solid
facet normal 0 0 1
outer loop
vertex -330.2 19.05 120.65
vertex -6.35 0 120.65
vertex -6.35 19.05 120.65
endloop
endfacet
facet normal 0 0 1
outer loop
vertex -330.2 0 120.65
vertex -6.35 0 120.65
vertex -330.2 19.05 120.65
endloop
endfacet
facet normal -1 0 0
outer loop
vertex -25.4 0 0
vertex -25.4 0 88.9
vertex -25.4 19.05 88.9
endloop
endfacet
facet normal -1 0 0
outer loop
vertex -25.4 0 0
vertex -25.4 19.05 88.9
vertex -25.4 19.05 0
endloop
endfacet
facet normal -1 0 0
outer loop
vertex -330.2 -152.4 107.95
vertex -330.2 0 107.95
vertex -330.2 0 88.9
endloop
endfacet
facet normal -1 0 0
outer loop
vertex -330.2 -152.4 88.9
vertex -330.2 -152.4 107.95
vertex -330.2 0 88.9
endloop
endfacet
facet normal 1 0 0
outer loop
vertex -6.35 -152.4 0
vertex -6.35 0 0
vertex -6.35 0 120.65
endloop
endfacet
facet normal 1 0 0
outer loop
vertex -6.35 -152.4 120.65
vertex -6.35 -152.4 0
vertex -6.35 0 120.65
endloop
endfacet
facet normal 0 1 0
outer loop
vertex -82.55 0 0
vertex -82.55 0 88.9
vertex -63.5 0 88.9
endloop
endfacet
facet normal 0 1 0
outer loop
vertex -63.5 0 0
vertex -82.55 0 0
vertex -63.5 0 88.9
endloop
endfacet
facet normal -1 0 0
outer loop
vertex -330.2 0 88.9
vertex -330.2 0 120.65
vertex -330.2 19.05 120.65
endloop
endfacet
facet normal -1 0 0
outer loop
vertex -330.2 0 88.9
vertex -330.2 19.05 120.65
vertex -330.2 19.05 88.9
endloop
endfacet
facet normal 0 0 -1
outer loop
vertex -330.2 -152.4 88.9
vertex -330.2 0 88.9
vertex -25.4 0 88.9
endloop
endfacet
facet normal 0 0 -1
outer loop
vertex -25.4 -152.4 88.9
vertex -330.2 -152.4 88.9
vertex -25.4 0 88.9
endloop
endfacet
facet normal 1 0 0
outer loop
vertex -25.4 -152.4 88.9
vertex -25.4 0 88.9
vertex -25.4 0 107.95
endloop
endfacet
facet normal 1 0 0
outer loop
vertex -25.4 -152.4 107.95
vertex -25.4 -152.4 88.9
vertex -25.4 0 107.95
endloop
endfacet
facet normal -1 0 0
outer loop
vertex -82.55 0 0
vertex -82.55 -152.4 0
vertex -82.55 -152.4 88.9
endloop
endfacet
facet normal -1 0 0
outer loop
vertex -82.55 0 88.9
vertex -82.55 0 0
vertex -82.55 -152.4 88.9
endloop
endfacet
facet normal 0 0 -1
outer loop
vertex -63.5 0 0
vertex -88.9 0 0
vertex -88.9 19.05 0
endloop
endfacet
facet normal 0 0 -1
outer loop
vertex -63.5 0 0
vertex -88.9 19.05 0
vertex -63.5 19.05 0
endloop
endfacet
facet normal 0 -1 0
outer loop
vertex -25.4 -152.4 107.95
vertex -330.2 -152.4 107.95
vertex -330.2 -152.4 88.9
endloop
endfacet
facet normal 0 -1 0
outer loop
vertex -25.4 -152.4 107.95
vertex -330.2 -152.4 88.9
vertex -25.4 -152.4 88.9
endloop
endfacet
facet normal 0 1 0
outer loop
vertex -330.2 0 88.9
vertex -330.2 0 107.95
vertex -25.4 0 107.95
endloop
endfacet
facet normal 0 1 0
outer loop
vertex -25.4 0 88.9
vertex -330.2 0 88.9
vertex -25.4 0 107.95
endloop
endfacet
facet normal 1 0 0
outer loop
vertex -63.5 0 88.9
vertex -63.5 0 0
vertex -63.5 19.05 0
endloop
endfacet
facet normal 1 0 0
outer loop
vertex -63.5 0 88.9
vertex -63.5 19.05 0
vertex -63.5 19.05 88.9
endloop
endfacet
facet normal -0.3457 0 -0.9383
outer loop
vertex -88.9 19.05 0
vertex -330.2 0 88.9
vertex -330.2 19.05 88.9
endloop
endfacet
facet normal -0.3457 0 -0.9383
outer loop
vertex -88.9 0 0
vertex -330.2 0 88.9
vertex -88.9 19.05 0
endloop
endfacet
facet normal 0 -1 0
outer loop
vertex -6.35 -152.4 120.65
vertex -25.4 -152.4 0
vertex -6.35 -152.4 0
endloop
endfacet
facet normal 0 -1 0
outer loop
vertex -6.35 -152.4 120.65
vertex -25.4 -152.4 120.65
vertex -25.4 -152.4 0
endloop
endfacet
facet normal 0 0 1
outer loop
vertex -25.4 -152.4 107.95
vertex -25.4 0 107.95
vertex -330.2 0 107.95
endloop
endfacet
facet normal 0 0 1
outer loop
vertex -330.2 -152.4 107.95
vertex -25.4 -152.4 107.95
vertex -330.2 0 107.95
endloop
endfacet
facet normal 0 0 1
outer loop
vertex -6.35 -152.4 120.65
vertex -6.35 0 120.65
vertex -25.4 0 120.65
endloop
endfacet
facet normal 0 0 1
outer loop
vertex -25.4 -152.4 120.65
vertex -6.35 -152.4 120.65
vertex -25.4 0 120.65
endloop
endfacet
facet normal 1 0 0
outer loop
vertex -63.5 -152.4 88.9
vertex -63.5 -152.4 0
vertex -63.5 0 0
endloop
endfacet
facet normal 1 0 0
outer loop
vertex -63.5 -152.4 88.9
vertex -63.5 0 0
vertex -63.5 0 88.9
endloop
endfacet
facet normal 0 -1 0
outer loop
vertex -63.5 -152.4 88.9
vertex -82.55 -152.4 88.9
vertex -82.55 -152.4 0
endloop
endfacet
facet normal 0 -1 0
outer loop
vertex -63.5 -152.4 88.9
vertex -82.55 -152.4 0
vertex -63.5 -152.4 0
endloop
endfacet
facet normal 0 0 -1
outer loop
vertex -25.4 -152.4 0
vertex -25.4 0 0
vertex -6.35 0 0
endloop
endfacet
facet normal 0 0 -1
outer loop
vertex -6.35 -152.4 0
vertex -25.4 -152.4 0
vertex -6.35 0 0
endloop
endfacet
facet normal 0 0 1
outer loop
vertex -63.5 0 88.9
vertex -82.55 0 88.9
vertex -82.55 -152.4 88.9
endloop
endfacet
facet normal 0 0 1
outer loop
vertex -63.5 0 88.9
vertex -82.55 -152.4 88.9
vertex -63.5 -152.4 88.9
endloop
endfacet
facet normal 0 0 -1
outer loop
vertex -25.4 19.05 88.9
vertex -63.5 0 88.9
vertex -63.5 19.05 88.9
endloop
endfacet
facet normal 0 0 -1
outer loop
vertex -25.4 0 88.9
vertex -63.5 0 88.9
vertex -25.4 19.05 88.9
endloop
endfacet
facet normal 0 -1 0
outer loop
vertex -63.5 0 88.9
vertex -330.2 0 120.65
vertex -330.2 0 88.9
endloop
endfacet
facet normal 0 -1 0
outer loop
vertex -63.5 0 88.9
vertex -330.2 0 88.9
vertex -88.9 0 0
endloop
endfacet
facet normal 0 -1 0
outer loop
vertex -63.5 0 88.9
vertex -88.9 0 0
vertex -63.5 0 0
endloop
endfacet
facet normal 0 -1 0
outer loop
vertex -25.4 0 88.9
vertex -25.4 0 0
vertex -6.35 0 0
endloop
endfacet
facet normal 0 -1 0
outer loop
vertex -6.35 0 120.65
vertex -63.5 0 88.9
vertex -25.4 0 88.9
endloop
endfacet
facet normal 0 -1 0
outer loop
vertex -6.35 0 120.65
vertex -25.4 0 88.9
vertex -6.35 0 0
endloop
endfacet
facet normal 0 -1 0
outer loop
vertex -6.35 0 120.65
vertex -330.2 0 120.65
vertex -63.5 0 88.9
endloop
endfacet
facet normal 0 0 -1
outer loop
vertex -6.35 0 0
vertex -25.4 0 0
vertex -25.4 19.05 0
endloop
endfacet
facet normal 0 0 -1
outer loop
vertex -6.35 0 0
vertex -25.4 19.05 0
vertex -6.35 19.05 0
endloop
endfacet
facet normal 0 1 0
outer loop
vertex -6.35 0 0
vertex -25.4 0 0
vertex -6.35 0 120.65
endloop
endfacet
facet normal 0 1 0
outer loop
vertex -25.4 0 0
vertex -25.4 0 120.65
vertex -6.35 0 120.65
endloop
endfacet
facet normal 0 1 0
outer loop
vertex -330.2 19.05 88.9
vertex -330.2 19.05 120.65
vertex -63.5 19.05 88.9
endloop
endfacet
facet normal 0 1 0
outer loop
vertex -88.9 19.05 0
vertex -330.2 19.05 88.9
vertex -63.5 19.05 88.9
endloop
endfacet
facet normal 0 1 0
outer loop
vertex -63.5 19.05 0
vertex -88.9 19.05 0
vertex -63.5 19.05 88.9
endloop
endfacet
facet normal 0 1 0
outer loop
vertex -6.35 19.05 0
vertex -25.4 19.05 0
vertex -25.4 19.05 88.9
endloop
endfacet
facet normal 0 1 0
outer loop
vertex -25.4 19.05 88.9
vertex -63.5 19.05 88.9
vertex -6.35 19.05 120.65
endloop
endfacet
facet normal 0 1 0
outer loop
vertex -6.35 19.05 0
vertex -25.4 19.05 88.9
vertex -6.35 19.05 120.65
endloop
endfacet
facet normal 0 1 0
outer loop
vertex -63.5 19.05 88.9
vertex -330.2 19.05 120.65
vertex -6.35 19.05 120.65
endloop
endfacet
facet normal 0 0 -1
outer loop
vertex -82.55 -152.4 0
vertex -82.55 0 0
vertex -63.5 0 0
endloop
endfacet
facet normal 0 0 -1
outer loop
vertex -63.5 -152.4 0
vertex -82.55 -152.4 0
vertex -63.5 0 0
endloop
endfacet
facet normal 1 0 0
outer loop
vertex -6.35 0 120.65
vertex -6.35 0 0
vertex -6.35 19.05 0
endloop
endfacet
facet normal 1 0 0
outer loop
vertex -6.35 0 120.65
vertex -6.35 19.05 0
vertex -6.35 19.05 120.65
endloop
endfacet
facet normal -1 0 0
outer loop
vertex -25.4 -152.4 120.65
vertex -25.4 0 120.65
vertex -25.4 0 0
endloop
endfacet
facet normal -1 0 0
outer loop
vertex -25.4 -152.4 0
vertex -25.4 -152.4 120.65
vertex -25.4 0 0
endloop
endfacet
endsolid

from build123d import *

# Parameters (mm, degrees)
F1_DEPTH = 152.4
F0_W     = 19.05
F0_H     = 88.9
F2_DEPTH = 152.4
F3_DEPTH = 152.4
F0_W_2   = 304.8
F0_H_2   = 12.7
F4_DEPTH = 19.05


with BuildPart() as f1:
    # F0 (on Front) → F1 (new body)
    with BuildSketch(Plane.XZ):
        Polygon((-63.5, 88.9), (-25.4, 88.9), (-25.4, 107.95), (-330.2, 107.95), (-330.2, 88.9), (-82.55, 88.9), align=None)
    extrude(amount=F1_DEPTH)


with BuildPart() as f2:
    # F0 (on Front) → F2 (new body, through all)
    with BuildSketch(Plane.XZ):
        with Locations((-73.025, 44.45)):
            Rectangle(F0_W, F0_H)
    extrude(amount=F2_DEPTH)


with BuildPart() as f3:
    # F0 (on Front) → F3 (new body, through all)
    with BuildSketch(Plane.XZ):
        Polygon((-25.4, 0), (-6.35, 0), (-6.35, 120.65), (-25.4, 120.65), (-25.4, 107.95), (-25.4, 88.9), align=None)
    extrude(amount=F3_DEPTH)


with BuildPart() as f4:
    # F0 (on Front) → F4 (new body)
    with BuildSketch(Plane.XZ):
        with Locations((-177.8, 114.3)):
            Rectangle(F0_W_2, F0_H_2)
        Polygon((-63.5, 88.9), (-25.4, 88.9), (-25.4, 107.95), (-330.2, 107.95), (-330.2, 88.9), (-82.55, 88.9), align=None)
        Polygon((-82.55, 0), (-82.55, 88.9), (-330.2, 88.9), (-88.9, 0), align=None)
        with Locations((-73.025, 44.45)):
            Rectangle(F0_W, F0_H)
        Polygon((-25.4, 0), (-6.35, 0), (-6.35, 120.65), (-25.4, 120.65), (-25.4, 107.95), (-25.4, 88.9), align=None)
    extrude(amount=-F4_DEPTH)


solid = Compound([f1.part, f2.part, f3.part, f4.part])
